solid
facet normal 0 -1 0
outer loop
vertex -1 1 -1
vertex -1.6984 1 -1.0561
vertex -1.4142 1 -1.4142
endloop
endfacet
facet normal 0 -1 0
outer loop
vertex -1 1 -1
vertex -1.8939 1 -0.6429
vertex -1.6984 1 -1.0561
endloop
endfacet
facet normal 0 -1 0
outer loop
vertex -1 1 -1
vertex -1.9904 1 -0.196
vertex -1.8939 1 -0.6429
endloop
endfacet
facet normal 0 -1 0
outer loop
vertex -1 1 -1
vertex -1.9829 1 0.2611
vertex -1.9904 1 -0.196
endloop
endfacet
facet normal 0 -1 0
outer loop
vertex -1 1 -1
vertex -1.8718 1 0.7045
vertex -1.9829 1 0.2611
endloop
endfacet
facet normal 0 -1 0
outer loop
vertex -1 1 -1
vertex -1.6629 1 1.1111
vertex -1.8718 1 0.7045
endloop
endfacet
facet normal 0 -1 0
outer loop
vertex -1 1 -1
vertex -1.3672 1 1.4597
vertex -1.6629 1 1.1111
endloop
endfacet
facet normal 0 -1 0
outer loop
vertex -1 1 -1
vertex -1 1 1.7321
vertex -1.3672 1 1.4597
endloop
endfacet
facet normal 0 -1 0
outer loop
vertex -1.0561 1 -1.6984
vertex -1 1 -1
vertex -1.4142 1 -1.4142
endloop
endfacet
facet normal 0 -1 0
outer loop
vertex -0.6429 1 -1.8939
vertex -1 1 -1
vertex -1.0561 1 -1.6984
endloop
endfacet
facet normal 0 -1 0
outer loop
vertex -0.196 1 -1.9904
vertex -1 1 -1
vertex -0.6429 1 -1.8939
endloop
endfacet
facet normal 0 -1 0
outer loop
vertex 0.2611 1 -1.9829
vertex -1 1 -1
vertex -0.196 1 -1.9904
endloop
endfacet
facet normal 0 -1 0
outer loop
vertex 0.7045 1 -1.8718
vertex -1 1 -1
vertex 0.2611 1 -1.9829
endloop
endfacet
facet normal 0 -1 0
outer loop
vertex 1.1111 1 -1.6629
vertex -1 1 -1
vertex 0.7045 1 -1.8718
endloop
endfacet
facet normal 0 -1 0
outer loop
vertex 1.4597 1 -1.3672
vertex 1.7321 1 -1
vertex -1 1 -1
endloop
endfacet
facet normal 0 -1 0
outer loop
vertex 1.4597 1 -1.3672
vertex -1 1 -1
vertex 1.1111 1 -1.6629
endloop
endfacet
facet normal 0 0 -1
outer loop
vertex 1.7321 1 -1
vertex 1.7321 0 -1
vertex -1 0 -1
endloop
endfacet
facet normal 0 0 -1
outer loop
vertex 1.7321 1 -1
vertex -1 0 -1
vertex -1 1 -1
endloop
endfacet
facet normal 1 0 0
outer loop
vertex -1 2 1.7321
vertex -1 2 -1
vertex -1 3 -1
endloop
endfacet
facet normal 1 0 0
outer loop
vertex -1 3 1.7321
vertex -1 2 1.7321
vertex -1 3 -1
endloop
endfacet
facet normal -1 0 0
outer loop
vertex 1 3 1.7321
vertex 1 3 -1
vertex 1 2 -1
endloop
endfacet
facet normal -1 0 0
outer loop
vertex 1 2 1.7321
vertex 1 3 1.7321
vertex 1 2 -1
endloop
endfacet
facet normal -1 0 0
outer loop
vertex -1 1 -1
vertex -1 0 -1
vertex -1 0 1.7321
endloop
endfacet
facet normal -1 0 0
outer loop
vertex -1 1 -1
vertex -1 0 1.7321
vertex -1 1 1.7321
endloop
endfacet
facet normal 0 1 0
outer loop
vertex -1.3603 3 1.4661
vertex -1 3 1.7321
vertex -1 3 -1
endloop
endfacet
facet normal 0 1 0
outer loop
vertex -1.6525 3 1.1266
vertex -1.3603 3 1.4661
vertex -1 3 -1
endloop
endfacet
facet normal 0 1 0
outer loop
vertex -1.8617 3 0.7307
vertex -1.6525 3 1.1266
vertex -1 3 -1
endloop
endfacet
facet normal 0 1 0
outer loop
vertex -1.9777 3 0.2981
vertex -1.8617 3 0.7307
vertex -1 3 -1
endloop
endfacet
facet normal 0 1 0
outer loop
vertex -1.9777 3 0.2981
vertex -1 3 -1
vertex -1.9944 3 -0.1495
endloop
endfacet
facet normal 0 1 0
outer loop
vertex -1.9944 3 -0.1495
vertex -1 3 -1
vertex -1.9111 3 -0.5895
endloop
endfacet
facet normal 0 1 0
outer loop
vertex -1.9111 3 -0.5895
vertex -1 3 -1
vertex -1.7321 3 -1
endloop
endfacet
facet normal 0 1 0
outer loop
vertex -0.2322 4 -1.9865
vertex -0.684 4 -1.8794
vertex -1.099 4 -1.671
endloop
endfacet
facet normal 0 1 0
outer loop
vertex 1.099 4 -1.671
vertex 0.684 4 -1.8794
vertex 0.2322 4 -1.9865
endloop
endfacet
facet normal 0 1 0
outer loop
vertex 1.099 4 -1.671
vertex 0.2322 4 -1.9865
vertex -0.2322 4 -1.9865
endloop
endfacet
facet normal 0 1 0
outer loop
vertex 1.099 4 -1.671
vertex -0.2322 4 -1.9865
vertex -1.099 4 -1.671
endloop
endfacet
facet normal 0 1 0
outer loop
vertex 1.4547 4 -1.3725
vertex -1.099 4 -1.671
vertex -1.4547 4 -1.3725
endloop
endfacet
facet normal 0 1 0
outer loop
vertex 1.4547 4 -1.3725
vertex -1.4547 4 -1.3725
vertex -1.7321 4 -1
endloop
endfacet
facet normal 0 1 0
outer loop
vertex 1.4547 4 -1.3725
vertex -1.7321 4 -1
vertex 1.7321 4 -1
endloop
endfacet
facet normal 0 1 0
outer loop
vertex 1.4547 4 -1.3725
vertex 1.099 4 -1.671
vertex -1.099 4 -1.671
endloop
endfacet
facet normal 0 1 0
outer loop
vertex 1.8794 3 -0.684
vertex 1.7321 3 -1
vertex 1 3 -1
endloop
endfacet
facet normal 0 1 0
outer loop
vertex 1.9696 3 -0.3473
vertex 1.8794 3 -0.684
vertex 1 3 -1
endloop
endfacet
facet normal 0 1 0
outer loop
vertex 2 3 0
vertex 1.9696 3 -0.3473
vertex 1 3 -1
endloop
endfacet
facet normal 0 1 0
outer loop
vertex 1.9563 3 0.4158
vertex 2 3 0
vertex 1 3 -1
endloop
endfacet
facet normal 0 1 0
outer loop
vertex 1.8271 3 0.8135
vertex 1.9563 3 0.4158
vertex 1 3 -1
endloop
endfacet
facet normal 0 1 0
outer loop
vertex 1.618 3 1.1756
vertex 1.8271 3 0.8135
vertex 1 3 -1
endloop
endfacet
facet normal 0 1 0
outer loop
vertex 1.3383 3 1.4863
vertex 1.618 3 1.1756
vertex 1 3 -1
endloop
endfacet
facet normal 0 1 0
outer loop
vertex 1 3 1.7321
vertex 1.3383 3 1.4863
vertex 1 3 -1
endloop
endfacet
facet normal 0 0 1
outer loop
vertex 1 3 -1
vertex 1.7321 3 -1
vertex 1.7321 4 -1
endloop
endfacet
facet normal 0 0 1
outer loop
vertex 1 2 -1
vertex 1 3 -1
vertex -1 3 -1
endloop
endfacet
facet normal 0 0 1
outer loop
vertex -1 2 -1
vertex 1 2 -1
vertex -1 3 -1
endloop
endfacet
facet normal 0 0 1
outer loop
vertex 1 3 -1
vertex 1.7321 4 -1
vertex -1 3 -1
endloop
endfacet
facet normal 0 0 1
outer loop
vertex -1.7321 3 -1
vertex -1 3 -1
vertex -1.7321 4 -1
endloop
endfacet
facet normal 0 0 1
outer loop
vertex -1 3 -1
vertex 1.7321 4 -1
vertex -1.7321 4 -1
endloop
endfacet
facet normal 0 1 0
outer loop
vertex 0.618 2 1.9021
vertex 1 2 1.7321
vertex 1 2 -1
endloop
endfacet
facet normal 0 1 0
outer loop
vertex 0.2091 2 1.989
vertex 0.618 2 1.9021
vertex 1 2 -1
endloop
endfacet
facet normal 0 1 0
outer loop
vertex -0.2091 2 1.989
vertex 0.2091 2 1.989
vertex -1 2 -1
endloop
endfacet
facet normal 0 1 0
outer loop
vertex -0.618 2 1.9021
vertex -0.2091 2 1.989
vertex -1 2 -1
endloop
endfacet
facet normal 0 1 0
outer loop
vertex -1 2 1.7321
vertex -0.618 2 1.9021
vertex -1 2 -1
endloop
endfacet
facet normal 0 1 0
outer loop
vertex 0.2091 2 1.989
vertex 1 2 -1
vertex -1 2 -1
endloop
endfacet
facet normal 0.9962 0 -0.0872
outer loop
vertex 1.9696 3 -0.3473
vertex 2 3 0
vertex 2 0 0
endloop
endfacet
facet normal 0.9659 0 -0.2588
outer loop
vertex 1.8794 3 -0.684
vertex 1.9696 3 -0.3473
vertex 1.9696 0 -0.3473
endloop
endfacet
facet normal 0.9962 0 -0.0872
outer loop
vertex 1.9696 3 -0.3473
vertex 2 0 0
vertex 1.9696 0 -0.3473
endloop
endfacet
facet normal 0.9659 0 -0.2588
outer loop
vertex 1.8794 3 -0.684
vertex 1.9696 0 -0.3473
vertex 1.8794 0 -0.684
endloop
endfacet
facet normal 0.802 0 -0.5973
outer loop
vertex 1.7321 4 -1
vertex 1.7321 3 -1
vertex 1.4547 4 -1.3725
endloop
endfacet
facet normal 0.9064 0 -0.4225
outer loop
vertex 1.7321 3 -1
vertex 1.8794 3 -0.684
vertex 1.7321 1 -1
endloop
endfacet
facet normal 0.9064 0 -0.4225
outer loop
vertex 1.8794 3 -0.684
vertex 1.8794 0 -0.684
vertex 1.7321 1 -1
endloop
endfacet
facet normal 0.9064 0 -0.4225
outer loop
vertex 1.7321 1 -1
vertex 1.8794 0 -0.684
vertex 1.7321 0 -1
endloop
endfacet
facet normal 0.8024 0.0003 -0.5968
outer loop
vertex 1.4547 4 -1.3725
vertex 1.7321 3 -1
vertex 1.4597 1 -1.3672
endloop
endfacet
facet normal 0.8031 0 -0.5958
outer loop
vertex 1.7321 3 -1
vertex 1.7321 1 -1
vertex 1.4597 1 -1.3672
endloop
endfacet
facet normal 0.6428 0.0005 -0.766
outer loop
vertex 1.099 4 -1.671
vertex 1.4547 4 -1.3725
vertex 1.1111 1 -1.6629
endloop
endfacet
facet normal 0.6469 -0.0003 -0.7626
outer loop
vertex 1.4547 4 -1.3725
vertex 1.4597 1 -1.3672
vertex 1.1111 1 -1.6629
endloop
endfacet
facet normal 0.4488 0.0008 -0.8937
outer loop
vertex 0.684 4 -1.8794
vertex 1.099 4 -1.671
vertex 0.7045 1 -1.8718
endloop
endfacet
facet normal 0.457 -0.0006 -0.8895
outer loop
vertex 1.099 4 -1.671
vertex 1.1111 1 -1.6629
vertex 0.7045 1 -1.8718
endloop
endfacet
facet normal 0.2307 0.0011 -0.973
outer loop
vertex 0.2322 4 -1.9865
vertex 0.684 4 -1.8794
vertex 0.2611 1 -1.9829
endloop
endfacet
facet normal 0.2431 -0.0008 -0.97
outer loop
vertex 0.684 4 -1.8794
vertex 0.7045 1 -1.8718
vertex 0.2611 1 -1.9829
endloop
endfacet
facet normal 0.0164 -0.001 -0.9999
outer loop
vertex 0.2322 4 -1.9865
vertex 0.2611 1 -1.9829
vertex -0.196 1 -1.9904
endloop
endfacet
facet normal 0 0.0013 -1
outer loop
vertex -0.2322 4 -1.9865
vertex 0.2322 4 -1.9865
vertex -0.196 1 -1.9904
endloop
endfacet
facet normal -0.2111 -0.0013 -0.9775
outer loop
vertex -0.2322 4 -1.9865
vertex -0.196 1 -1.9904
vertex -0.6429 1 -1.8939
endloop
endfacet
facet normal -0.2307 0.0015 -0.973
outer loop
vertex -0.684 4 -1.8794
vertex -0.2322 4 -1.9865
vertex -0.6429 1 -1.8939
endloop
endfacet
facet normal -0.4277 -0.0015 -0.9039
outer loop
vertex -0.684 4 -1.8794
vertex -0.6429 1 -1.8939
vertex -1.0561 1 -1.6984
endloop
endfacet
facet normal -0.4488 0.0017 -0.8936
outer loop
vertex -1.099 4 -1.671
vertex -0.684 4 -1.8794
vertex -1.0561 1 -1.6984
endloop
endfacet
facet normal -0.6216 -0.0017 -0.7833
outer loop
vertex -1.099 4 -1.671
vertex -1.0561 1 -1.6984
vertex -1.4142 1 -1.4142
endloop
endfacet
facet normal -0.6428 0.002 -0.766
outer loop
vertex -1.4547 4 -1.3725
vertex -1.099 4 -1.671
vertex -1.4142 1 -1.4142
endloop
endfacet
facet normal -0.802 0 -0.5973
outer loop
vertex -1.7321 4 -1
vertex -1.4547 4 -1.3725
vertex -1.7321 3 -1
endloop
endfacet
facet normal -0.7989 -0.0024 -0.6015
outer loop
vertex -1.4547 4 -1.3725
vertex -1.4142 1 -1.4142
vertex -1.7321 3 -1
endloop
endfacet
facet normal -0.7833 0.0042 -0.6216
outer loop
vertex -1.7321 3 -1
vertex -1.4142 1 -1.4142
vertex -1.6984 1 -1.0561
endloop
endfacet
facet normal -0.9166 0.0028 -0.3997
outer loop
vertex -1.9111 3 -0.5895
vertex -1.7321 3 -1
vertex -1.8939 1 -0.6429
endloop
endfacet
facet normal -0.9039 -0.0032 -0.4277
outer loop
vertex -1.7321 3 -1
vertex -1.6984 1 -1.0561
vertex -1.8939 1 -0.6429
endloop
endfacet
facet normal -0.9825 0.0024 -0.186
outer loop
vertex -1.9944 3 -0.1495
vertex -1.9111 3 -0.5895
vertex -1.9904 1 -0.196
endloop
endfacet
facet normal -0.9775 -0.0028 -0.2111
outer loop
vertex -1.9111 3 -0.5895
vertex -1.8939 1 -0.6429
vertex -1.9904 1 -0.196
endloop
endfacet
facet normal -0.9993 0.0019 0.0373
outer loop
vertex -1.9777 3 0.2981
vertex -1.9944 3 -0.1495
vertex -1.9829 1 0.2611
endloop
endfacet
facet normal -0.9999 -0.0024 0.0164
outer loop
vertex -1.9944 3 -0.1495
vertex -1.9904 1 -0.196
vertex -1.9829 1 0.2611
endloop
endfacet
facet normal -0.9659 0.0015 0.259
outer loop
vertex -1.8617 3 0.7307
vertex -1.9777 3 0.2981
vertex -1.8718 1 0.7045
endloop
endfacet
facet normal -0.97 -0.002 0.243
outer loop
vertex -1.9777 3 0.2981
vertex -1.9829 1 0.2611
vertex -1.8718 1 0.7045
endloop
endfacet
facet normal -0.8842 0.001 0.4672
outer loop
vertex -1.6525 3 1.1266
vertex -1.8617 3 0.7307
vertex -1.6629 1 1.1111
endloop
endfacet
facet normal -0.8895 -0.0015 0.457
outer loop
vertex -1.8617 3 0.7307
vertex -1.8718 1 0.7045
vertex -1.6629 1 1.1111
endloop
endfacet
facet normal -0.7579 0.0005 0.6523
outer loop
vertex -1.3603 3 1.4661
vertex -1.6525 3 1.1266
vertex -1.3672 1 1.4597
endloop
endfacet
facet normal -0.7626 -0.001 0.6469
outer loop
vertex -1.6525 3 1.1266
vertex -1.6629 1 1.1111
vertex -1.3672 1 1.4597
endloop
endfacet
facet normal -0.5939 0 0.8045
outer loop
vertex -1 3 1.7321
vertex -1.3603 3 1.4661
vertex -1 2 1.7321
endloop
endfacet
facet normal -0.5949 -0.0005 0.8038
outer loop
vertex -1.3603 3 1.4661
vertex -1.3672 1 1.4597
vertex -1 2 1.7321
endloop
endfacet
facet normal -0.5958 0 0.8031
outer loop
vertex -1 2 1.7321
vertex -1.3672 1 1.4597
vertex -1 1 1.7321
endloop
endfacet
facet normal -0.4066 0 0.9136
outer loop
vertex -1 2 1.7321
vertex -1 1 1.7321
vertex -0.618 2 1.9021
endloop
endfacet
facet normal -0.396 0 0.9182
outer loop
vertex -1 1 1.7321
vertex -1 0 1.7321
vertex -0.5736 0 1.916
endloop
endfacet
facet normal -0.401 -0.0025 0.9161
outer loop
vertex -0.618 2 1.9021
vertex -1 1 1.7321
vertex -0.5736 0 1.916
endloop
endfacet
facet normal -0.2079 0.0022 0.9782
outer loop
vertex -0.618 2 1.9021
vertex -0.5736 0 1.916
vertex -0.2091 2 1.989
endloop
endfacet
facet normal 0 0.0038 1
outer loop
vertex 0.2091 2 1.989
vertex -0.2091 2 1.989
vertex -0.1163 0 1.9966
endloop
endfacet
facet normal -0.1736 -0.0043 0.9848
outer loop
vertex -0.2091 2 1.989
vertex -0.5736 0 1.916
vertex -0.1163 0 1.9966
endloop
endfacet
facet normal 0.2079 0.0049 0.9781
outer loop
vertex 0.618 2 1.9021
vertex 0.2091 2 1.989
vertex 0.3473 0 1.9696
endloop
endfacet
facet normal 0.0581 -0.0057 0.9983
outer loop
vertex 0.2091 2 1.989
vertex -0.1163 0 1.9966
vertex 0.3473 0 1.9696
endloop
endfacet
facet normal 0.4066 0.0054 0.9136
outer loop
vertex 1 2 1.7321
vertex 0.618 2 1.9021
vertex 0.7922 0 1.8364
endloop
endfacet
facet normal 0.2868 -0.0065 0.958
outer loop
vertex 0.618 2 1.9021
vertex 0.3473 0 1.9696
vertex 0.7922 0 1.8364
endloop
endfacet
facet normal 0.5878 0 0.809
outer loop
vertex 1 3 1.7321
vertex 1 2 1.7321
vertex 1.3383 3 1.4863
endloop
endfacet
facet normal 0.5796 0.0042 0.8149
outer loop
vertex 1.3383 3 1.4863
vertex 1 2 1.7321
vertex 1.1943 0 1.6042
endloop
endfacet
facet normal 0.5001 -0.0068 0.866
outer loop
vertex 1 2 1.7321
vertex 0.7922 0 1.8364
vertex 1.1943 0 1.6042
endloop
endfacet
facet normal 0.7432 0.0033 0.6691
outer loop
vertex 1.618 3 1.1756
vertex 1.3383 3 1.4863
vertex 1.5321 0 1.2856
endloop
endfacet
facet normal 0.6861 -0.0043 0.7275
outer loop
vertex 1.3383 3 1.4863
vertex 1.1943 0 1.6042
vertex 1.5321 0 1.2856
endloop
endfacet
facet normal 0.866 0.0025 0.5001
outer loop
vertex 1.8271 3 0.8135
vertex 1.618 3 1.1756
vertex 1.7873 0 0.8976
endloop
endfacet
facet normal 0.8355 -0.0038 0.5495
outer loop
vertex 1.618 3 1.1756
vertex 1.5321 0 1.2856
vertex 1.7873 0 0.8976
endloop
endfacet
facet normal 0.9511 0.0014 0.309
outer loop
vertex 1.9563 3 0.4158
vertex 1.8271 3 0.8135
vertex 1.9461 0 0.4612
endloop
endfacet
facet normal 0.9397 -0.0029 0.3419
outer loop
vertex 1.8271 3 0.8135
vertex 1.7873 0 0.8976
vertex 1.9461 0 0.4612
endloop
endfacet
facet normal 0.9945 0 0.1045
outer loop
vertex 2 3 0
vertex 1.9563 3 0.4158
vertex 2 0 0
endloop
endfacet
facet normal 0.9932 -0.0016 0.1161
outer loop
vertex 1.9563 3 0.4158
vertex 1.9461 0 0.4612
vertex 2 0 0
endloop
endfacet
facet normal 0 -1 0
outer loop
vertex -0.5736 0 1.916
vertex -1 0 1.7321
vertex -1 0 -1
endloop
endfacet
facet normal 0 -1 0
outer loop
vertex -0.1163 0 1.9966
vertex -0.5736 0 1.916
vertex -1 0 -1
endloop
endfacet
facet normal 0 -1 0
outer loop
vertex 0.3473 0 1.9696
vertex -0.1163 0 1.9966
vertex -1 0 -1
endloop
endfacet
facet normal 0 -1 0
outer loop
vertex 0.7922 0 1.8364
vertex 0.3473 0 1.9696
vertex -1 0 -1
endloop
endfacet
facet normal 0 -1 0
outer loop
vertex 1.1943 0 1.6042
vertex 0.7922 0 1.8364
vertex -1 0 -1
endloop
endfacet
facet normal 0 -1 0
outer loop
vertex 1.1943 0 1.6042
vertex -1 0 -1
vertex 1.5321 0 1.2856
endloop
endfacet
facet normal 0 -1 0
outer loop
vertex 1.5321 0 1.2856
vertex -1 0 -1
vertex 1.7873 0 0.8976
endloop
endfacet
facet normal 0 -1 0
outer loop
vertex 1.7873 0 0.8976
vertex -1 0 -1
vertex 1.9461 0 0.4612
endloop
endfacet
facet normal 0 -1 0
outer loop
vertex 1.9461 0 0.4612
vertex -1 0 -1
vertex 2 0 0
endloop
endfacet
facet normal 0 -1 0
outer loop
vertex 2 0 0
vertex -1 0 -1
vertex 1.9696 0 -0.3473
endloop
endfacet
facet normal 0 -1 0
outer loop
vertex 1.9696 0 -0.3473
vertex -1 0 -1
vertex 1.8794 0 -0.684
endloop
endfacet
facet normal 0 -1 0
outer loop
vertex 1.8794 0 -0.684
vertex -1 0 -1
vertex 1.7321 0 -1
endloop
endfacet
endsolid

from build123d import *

# Parameters (mm, degrees)
SKETCH1_R               = 2
BOSS_EXTRUDE1_DEPTH     = 4
SKETCH2_W               = 1
SKETCH2_H               = 1
CUT_EXTRUDE4_DEPTH      = 11
CUT_EXTRUDE4_DEPTH_BACK = 1
SKETCH5_W               = 1
SKETCH5_H               = 1
CUT_EXTRUDE5_DEPTH      = 5.5


with BuildPart() as part:
    # Sketch1 → Boss-Extrude1 (new body)
    with BuildSketch(Plane(origin=(0, 0, 0), x_dir=(1, 0, 0), z_dir=(0, 1, 0))):
        Circle(SKETCH1_R)
    extrude(amount=BOSS_EXTRUDE1_DEPTH)

    # Sketch2 → Cut-Extrude4 (cut, two sides)
    with BuildSketch(Plane.XY) as cut_extrude4_sk:
        Polygon((-2, 4), (2, 4), (2, 3), (1, 3), (1, 2), (-1, 2), (-1, 3), (-2, 3), align=None)
        with Locations((-1.5, 0.5)):
            Rectangle(SKETCH2_W, SKETCH2_H)
    extrude(amount=CUT_EXTRUDE4_DEPTH, mode=Mode.SUBTRACT)
    extrude(cut_extrude4_sk.sketch, amount=-CUT_EXTRUDE4_DEPTH_BACK, mode=Mode.SUBTRACT)

    # Sketch5 → Cut-Extrude5 (cut, symmetric)
    with BuildSketch(Plane(origin=(0, 0, 0), x_dir=(0, 0, -1), z_dir=(1, 0, 0))):
        with Locations((1.5, 0.5)):
            Rectangle(SKETCH5_W, SKETCH5_H)
    extrude(amount=CUT_EXTRUDE5_DEPTH, both=True, mode=Mode.SUBTRACT)


solid = part.part
